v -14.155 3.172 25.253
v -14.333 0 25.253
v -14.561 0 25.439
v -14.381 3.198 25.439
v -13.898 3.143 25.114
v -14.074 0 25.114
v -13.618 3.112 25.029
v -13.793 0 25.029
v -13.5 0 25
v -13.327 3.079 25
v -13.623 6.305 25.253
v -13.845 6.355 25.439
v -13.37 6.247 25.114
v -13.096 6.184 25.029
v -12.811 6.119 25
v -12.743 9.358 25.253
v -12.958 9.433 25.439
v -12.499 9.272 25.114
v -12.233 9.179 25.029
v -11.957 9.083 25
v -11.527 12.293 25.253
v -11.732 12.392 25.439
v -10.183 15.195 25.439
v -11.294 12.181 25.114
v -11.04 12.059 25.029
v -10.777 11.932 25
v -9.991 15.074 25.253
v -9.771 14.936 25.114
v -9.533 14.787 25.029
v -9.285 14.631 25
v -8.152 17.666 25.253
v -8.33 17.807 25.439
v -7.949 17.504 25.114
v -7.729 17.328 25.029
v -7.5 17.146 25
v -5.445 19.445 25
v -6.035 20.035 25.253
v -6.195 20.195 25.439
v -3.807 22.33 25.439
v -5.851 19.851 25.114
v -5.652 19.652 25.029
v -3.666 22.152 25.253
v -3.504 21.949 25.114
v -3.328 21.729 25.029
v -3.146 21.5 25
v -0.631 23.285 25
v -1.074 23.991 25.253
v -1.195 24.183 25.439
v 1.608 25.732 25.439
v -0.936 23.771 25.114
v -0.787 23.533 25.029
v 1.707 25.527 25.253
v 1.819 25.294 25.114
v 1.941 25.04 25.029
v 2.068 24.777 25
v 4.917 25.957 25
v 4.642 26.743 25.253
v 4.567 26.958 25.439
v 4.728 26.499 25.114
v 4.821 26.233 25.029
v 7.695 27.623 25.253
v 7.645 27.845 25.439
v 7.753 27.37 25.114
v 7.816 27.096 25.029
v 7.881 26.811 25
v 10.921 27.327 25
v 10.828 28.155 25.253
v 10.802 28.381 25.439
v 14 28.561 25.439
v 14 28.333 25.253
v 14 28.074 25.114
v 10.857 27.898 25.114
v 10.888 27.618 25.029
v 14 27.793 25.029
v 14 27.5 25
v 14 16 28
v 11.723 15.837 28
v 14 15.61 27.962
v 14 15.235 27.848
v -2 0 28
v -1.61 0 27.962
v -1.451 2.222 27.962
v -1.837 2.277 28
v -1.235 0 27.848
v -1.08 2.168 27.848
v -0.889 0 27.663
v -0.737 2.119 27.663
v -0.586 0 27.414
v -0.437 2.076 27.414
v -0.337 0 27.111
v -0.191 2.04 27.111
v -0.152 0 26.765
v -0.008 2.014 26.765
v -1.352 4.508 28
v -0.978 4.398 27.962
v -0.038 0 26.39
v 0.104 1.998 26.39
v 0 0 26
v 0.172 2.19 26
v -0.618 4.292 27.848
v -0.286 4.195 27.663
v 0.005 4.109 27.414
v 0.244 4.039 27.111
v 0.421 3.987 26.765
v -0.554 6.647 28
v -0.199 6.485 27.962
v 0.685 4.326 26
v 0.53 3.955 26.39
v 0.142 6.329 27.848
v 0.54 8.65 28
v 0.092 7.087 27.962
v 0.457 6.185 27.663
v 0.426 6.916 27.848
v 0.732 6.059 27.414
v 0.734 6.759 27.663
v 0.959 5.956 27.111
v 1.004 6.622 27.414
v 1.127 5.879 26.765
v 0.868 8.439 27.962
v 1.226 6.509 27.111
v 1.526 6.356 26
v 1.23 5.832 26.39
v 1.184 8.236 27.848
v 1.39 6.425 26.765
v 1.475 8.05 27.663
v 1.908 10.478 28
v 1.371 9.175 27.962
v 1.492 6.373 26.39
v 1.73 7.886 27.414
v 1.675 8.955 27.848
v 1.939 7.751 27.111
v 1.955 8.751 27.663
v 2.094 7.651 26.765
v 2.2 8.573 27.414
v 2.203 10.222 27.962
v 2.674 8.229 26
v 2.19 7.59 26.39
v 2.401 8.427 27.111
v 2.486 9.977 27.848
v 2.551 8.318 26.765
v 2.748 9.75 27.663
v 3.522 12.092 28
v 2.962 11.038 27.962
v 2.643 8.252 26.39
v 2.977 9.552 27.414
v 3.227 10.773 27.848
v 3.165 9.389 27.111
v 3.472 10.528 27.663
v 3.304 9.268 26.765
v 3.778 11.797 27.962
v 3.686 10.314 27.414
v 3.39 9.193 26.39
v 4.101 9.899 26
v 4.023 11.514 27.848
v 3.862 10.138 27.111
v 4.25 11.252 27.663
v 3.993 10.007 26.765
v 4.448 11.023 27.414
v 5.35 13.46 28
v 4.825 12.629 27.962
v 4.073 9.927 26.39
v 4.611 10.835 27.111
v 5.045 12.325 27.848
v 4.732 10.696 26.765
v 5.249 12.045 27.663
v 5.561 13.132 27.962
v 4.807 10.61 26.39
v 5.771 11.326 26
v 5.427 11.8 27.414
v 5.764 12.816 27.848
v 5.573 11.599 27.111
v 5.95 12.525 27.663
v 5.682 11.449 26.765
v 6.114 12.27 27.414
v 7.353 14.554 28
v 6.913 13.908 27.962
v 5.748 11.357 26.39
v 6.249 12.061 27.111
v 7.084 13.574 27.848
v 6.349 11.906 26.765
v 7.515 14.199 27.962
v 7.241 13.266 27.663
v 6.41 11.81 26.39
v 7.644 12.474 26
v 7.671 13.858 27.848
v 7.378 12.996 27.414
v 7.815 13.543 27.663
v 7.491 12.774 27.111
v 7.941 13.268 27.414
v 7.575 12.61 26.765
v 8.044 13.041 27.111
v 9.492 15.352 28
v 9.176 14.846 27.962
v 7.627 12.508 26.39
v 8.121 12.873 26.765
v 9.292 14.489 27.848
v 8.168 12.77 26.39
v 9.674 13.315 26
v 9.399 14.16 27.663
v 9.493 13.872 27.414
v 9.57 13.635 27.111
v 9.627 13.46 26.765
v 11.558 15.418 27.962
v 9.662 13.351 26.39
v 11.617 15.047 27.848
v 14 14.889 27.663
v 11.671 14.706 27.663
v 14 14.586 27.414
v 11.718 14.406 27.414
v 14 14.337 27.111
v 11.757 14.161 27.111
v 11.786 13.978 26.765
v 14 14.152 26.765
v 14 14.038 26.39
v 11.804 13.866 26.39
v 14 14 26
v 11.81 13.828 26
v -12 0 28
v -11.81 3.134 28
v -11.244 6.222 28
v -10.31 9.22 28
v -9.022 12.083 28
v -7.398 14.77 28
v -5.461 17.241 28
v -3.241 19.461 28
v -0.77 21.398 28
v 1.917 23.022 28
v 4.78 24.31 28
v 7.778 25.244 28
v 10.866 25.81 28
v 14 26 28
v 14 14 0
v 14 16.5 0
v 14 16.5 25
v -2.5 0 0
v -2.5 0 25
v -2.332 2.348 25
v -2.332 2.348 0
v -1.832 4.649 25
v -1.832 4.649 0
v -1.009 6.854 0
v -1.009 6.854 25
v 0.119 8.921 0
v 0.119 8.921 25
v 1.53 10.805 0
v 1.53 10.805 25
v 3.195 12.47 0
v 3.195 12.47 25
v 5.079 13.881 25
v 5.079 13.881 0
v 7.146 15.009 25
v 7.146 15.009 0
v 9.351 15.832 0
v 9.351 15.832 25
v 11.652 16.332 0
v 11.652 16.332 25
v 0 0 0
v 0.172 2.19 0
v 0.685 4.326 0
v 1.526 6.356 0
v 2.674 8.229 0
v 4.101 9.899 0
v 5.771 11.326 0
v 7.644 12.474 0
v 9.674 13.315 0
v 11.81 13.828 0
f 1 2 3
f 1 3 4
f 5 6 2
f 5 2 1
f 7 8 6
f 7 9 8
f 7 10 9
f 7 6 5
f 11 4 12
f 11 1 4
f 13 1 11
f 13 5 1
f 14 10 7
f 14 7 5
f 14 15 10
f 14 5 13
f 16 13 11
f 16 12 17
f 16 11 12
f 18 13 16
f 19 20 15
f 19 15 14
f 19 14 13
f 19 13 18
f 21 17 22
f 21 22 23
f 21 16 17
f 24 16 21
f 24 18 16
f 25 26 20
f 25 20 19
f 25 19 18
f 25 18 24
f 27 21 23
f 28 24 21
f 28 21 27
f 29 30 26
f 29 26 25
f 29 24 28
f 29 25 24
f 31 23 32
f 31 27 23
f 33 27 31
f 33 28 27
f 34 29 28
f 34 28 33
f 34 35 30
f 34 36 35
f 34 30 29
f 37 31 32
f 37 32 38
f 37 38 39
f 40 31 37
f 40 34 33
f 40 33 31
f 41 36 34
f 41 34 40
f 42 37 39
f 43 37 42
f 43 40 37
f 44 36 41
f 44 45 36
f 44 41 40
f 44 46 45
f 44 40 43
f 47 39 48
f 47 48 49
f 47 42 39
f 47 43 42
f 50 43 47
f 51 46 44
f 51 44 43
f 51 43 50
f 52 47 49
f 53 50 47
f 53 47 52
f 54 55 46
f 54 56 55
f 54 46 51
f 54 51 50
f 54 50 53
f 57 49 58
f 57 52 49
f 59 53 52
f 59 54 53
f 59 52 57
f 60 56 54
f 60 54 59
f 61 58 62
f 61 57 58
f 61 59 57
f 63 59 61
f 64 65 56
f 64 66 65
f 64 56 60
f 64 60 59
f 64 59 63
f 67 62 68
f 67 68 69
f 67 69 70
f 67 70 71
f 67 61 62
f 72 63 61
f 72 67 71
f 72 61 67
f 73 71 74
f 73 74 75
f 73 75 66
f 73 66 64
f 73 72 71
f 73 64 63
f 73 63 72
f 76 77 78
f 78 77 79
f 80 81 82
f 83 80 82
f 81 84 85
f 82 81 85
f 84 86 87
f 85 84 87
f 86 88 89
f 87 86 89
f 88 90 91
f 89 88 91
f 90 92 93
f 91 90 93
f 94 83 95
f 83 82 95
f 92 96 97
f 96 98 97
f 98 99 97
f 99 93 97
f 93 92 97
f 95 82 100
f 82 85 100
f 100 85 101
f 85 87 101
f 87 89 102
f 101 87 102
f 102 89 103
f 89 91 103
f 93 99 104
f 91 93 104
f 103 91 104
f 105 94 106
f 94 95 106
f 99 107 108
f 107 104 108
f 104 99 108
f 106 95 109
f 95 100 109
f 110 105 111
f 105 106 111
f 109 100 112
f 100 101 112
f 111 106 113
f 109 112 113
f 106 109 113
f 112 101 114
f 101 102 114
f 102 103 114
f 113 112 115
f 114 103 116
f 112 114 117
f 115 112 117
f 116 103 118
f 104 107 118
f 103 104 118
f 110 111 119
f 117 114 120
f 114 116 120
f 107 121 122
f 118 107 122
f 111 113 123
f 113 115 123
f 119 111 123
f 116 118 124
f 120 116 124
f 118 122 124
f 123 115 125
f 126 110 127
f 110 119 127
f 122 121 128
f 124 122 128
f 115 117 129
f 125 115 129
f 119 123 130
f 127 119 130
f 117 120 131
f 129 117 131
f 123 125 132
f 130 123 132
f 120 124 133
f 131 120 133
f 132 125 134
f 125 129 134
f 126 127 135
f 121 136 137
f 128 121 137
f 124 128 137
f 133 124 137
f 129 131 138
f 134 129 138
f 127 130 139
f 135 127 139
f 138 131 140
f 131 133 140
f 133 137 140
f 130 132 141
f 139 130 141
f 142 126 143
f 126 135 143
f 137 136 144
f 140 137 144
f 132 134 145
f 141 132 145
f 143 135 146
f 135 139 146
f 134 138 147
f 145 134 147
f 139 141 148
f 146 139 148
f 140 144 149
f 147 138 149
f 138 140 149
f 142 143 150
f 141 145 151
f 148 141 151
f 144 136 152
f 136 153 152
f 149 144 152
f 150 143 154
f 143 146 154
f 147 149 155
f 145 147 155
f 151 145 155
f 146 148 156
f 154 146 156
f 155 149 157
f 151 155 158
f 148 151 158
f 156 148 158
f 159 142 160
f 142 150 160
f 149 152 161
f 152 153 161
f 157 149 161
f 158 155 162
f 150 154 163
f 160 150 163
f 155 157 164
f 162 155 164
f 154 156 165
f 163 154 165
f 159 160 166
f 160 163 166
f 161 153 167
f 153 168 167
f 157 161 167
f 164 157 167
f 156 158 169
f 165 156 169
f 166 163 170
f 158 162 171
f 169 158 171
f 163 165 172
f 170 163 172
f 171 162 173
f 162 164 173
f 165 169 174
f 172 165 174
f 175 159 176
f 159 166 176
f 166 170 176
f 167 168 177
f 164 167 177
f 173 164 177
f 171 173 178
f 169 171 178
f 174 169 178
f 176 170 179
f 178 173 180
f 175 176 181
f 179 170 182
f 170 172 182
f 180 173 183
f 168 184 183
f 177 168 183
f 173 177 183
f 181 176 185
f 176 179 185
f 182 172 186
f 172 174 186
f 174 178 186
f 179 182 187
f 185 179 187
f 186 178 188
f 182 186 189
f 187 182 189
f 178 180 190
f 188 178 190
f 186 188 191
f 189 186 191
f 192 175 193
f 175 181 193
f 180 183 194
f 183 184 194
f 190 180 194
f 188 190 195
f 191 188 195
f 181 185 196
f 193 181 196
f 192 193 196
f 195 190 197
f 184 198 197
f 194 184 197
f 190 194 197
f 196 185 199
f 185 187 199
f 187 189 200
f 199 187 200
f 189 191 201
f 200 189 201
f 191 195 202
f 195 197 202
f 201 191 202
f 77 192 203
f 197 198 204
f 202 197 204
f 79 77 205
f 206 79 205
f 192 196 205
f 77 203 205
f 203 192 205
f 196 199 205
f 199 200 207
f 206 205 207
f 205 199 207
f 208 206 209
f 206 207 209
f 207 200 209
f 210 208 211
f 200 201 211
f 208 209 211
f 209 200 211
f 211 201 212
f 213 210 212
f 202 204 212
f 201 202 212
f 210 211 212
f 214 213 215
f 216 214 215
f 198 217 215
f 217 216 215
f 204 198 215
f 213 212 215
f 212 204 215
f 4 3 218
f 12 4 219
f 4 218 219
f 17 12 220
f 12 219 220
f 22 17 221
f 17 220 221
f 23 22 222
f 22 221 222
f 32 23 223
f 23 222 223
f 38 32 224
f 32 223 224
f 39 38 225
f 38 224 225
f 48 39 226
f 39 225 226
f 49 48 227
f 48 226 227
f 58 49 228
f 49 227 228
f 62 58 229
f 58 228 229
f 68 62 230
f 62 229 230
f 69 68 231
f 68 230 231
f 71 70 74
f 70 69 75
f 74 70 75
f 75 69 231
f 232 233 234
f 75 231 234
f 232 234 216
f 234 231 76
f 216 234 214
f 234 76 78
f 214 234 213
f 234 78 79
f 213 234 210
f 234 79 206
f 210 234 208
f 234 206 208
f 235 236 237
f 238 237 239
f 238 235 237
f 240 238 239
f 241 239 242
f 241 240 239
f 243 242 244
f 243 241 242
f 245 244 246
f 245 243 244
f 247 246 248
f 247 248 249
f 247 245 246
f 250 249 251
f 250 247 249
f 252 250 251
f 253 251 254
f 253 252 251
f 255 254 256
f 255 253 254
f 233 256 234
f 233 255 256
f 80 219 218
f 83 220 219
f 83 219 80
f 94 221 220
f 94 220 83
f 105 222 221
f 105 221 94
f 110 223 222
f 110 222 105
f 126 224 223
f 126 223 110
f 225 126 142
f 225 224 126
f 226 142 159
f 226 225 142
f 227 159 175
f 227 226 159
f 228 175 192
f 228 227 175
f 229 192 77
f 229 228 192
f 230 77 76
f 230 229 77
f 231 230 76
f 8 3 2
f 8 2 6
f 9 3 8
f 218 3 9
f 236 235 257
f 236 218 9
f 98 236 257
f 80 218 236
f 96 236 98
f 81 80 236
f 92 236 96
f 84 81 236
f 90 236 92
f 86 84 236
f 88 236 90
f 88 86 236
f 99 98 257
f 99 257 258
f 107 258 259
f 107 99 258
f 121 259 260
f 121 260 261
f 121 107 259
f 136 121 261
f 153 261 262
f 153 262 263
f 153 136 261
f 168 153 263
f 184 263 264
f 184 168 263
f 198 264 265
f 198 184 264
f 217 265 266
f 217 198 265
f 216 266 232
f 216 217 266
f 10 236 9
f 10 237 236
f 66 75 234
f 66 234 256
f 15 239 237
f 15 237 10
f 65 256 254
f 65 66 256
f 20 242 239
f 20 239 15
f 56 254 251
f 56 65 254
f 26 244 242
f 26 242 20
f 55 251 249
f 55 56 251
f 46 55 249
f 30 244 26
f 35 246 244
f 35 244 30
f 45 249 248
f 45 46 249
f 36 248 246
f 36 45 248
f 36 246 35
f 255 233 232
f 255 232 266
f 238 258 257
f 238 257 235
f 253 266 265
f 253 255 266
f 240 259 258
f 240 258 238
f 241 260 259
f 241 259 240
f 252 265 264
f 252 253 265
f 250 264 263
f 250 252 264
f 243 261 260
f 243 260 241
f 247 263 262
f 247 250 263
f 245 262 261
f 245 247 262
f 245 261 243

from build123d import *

# Parameters (mm, degrees)
F1_ANGLE    = 90
F2_R        = 1.5
F3_T2_ANGLE = 120.4977458854
F4_R        = 2


# Not quite as in the source:
# - a fillet or chamfer that OpenCascade refuses, or shapes differently, is made with other operations: its cross-section is extruded or revolved along the edge and cut away or added


with BuildPart() as f1:
    # F0 (on Front) → F1 (revolve)
    with BuildSketch(Plane.XZ):
        Polygon((-2.5, 0), (0, 0), (0, 28), (-15, 28), (-15, 25), (-12.5, 25), (-2.5, 25), align=None)
    revolve(axis=Axis((14, 0, -3.1492561102), (0, 0, -1)), revolution_arc=F1_ANGLE)

    # F2
    f2_edges = [f1.edges().sort_by_distance(p)[0] for p in [
        (-6.506097, 20.506097, 25),
    ]]
    fillet(f2_edges, radius=F2_R)

    # F3: chamfer of 3 on 1 edges, made by hand

    # F3_s1 → F3_t2 (revolve, cut)
    with BuildSketch(Plane(origin=(0.9684561095, -3.5525312522, 0), x_dir=(0, 0, 1), z_dir=(0.2630122362, -0.9647924977, 0))):
        Polygon((25, 15.4929050323), (28, 12.4929050323), (28, 15.4929050323), align=None)
    revolve(axis=Axis((14, 0, 28), (0, 0, -1)), revolution_arc=F3_T2_ANGLE, mode=Mode.SUBTRACT)

    # F4
    f4_edges = [f1.edges().sort_by_distance(p)[0] for p in [
        (4.100505, 9.899495, 28),
    ]]
    fillet(f4_edges, radius=F4_R)


solid = f1.part
